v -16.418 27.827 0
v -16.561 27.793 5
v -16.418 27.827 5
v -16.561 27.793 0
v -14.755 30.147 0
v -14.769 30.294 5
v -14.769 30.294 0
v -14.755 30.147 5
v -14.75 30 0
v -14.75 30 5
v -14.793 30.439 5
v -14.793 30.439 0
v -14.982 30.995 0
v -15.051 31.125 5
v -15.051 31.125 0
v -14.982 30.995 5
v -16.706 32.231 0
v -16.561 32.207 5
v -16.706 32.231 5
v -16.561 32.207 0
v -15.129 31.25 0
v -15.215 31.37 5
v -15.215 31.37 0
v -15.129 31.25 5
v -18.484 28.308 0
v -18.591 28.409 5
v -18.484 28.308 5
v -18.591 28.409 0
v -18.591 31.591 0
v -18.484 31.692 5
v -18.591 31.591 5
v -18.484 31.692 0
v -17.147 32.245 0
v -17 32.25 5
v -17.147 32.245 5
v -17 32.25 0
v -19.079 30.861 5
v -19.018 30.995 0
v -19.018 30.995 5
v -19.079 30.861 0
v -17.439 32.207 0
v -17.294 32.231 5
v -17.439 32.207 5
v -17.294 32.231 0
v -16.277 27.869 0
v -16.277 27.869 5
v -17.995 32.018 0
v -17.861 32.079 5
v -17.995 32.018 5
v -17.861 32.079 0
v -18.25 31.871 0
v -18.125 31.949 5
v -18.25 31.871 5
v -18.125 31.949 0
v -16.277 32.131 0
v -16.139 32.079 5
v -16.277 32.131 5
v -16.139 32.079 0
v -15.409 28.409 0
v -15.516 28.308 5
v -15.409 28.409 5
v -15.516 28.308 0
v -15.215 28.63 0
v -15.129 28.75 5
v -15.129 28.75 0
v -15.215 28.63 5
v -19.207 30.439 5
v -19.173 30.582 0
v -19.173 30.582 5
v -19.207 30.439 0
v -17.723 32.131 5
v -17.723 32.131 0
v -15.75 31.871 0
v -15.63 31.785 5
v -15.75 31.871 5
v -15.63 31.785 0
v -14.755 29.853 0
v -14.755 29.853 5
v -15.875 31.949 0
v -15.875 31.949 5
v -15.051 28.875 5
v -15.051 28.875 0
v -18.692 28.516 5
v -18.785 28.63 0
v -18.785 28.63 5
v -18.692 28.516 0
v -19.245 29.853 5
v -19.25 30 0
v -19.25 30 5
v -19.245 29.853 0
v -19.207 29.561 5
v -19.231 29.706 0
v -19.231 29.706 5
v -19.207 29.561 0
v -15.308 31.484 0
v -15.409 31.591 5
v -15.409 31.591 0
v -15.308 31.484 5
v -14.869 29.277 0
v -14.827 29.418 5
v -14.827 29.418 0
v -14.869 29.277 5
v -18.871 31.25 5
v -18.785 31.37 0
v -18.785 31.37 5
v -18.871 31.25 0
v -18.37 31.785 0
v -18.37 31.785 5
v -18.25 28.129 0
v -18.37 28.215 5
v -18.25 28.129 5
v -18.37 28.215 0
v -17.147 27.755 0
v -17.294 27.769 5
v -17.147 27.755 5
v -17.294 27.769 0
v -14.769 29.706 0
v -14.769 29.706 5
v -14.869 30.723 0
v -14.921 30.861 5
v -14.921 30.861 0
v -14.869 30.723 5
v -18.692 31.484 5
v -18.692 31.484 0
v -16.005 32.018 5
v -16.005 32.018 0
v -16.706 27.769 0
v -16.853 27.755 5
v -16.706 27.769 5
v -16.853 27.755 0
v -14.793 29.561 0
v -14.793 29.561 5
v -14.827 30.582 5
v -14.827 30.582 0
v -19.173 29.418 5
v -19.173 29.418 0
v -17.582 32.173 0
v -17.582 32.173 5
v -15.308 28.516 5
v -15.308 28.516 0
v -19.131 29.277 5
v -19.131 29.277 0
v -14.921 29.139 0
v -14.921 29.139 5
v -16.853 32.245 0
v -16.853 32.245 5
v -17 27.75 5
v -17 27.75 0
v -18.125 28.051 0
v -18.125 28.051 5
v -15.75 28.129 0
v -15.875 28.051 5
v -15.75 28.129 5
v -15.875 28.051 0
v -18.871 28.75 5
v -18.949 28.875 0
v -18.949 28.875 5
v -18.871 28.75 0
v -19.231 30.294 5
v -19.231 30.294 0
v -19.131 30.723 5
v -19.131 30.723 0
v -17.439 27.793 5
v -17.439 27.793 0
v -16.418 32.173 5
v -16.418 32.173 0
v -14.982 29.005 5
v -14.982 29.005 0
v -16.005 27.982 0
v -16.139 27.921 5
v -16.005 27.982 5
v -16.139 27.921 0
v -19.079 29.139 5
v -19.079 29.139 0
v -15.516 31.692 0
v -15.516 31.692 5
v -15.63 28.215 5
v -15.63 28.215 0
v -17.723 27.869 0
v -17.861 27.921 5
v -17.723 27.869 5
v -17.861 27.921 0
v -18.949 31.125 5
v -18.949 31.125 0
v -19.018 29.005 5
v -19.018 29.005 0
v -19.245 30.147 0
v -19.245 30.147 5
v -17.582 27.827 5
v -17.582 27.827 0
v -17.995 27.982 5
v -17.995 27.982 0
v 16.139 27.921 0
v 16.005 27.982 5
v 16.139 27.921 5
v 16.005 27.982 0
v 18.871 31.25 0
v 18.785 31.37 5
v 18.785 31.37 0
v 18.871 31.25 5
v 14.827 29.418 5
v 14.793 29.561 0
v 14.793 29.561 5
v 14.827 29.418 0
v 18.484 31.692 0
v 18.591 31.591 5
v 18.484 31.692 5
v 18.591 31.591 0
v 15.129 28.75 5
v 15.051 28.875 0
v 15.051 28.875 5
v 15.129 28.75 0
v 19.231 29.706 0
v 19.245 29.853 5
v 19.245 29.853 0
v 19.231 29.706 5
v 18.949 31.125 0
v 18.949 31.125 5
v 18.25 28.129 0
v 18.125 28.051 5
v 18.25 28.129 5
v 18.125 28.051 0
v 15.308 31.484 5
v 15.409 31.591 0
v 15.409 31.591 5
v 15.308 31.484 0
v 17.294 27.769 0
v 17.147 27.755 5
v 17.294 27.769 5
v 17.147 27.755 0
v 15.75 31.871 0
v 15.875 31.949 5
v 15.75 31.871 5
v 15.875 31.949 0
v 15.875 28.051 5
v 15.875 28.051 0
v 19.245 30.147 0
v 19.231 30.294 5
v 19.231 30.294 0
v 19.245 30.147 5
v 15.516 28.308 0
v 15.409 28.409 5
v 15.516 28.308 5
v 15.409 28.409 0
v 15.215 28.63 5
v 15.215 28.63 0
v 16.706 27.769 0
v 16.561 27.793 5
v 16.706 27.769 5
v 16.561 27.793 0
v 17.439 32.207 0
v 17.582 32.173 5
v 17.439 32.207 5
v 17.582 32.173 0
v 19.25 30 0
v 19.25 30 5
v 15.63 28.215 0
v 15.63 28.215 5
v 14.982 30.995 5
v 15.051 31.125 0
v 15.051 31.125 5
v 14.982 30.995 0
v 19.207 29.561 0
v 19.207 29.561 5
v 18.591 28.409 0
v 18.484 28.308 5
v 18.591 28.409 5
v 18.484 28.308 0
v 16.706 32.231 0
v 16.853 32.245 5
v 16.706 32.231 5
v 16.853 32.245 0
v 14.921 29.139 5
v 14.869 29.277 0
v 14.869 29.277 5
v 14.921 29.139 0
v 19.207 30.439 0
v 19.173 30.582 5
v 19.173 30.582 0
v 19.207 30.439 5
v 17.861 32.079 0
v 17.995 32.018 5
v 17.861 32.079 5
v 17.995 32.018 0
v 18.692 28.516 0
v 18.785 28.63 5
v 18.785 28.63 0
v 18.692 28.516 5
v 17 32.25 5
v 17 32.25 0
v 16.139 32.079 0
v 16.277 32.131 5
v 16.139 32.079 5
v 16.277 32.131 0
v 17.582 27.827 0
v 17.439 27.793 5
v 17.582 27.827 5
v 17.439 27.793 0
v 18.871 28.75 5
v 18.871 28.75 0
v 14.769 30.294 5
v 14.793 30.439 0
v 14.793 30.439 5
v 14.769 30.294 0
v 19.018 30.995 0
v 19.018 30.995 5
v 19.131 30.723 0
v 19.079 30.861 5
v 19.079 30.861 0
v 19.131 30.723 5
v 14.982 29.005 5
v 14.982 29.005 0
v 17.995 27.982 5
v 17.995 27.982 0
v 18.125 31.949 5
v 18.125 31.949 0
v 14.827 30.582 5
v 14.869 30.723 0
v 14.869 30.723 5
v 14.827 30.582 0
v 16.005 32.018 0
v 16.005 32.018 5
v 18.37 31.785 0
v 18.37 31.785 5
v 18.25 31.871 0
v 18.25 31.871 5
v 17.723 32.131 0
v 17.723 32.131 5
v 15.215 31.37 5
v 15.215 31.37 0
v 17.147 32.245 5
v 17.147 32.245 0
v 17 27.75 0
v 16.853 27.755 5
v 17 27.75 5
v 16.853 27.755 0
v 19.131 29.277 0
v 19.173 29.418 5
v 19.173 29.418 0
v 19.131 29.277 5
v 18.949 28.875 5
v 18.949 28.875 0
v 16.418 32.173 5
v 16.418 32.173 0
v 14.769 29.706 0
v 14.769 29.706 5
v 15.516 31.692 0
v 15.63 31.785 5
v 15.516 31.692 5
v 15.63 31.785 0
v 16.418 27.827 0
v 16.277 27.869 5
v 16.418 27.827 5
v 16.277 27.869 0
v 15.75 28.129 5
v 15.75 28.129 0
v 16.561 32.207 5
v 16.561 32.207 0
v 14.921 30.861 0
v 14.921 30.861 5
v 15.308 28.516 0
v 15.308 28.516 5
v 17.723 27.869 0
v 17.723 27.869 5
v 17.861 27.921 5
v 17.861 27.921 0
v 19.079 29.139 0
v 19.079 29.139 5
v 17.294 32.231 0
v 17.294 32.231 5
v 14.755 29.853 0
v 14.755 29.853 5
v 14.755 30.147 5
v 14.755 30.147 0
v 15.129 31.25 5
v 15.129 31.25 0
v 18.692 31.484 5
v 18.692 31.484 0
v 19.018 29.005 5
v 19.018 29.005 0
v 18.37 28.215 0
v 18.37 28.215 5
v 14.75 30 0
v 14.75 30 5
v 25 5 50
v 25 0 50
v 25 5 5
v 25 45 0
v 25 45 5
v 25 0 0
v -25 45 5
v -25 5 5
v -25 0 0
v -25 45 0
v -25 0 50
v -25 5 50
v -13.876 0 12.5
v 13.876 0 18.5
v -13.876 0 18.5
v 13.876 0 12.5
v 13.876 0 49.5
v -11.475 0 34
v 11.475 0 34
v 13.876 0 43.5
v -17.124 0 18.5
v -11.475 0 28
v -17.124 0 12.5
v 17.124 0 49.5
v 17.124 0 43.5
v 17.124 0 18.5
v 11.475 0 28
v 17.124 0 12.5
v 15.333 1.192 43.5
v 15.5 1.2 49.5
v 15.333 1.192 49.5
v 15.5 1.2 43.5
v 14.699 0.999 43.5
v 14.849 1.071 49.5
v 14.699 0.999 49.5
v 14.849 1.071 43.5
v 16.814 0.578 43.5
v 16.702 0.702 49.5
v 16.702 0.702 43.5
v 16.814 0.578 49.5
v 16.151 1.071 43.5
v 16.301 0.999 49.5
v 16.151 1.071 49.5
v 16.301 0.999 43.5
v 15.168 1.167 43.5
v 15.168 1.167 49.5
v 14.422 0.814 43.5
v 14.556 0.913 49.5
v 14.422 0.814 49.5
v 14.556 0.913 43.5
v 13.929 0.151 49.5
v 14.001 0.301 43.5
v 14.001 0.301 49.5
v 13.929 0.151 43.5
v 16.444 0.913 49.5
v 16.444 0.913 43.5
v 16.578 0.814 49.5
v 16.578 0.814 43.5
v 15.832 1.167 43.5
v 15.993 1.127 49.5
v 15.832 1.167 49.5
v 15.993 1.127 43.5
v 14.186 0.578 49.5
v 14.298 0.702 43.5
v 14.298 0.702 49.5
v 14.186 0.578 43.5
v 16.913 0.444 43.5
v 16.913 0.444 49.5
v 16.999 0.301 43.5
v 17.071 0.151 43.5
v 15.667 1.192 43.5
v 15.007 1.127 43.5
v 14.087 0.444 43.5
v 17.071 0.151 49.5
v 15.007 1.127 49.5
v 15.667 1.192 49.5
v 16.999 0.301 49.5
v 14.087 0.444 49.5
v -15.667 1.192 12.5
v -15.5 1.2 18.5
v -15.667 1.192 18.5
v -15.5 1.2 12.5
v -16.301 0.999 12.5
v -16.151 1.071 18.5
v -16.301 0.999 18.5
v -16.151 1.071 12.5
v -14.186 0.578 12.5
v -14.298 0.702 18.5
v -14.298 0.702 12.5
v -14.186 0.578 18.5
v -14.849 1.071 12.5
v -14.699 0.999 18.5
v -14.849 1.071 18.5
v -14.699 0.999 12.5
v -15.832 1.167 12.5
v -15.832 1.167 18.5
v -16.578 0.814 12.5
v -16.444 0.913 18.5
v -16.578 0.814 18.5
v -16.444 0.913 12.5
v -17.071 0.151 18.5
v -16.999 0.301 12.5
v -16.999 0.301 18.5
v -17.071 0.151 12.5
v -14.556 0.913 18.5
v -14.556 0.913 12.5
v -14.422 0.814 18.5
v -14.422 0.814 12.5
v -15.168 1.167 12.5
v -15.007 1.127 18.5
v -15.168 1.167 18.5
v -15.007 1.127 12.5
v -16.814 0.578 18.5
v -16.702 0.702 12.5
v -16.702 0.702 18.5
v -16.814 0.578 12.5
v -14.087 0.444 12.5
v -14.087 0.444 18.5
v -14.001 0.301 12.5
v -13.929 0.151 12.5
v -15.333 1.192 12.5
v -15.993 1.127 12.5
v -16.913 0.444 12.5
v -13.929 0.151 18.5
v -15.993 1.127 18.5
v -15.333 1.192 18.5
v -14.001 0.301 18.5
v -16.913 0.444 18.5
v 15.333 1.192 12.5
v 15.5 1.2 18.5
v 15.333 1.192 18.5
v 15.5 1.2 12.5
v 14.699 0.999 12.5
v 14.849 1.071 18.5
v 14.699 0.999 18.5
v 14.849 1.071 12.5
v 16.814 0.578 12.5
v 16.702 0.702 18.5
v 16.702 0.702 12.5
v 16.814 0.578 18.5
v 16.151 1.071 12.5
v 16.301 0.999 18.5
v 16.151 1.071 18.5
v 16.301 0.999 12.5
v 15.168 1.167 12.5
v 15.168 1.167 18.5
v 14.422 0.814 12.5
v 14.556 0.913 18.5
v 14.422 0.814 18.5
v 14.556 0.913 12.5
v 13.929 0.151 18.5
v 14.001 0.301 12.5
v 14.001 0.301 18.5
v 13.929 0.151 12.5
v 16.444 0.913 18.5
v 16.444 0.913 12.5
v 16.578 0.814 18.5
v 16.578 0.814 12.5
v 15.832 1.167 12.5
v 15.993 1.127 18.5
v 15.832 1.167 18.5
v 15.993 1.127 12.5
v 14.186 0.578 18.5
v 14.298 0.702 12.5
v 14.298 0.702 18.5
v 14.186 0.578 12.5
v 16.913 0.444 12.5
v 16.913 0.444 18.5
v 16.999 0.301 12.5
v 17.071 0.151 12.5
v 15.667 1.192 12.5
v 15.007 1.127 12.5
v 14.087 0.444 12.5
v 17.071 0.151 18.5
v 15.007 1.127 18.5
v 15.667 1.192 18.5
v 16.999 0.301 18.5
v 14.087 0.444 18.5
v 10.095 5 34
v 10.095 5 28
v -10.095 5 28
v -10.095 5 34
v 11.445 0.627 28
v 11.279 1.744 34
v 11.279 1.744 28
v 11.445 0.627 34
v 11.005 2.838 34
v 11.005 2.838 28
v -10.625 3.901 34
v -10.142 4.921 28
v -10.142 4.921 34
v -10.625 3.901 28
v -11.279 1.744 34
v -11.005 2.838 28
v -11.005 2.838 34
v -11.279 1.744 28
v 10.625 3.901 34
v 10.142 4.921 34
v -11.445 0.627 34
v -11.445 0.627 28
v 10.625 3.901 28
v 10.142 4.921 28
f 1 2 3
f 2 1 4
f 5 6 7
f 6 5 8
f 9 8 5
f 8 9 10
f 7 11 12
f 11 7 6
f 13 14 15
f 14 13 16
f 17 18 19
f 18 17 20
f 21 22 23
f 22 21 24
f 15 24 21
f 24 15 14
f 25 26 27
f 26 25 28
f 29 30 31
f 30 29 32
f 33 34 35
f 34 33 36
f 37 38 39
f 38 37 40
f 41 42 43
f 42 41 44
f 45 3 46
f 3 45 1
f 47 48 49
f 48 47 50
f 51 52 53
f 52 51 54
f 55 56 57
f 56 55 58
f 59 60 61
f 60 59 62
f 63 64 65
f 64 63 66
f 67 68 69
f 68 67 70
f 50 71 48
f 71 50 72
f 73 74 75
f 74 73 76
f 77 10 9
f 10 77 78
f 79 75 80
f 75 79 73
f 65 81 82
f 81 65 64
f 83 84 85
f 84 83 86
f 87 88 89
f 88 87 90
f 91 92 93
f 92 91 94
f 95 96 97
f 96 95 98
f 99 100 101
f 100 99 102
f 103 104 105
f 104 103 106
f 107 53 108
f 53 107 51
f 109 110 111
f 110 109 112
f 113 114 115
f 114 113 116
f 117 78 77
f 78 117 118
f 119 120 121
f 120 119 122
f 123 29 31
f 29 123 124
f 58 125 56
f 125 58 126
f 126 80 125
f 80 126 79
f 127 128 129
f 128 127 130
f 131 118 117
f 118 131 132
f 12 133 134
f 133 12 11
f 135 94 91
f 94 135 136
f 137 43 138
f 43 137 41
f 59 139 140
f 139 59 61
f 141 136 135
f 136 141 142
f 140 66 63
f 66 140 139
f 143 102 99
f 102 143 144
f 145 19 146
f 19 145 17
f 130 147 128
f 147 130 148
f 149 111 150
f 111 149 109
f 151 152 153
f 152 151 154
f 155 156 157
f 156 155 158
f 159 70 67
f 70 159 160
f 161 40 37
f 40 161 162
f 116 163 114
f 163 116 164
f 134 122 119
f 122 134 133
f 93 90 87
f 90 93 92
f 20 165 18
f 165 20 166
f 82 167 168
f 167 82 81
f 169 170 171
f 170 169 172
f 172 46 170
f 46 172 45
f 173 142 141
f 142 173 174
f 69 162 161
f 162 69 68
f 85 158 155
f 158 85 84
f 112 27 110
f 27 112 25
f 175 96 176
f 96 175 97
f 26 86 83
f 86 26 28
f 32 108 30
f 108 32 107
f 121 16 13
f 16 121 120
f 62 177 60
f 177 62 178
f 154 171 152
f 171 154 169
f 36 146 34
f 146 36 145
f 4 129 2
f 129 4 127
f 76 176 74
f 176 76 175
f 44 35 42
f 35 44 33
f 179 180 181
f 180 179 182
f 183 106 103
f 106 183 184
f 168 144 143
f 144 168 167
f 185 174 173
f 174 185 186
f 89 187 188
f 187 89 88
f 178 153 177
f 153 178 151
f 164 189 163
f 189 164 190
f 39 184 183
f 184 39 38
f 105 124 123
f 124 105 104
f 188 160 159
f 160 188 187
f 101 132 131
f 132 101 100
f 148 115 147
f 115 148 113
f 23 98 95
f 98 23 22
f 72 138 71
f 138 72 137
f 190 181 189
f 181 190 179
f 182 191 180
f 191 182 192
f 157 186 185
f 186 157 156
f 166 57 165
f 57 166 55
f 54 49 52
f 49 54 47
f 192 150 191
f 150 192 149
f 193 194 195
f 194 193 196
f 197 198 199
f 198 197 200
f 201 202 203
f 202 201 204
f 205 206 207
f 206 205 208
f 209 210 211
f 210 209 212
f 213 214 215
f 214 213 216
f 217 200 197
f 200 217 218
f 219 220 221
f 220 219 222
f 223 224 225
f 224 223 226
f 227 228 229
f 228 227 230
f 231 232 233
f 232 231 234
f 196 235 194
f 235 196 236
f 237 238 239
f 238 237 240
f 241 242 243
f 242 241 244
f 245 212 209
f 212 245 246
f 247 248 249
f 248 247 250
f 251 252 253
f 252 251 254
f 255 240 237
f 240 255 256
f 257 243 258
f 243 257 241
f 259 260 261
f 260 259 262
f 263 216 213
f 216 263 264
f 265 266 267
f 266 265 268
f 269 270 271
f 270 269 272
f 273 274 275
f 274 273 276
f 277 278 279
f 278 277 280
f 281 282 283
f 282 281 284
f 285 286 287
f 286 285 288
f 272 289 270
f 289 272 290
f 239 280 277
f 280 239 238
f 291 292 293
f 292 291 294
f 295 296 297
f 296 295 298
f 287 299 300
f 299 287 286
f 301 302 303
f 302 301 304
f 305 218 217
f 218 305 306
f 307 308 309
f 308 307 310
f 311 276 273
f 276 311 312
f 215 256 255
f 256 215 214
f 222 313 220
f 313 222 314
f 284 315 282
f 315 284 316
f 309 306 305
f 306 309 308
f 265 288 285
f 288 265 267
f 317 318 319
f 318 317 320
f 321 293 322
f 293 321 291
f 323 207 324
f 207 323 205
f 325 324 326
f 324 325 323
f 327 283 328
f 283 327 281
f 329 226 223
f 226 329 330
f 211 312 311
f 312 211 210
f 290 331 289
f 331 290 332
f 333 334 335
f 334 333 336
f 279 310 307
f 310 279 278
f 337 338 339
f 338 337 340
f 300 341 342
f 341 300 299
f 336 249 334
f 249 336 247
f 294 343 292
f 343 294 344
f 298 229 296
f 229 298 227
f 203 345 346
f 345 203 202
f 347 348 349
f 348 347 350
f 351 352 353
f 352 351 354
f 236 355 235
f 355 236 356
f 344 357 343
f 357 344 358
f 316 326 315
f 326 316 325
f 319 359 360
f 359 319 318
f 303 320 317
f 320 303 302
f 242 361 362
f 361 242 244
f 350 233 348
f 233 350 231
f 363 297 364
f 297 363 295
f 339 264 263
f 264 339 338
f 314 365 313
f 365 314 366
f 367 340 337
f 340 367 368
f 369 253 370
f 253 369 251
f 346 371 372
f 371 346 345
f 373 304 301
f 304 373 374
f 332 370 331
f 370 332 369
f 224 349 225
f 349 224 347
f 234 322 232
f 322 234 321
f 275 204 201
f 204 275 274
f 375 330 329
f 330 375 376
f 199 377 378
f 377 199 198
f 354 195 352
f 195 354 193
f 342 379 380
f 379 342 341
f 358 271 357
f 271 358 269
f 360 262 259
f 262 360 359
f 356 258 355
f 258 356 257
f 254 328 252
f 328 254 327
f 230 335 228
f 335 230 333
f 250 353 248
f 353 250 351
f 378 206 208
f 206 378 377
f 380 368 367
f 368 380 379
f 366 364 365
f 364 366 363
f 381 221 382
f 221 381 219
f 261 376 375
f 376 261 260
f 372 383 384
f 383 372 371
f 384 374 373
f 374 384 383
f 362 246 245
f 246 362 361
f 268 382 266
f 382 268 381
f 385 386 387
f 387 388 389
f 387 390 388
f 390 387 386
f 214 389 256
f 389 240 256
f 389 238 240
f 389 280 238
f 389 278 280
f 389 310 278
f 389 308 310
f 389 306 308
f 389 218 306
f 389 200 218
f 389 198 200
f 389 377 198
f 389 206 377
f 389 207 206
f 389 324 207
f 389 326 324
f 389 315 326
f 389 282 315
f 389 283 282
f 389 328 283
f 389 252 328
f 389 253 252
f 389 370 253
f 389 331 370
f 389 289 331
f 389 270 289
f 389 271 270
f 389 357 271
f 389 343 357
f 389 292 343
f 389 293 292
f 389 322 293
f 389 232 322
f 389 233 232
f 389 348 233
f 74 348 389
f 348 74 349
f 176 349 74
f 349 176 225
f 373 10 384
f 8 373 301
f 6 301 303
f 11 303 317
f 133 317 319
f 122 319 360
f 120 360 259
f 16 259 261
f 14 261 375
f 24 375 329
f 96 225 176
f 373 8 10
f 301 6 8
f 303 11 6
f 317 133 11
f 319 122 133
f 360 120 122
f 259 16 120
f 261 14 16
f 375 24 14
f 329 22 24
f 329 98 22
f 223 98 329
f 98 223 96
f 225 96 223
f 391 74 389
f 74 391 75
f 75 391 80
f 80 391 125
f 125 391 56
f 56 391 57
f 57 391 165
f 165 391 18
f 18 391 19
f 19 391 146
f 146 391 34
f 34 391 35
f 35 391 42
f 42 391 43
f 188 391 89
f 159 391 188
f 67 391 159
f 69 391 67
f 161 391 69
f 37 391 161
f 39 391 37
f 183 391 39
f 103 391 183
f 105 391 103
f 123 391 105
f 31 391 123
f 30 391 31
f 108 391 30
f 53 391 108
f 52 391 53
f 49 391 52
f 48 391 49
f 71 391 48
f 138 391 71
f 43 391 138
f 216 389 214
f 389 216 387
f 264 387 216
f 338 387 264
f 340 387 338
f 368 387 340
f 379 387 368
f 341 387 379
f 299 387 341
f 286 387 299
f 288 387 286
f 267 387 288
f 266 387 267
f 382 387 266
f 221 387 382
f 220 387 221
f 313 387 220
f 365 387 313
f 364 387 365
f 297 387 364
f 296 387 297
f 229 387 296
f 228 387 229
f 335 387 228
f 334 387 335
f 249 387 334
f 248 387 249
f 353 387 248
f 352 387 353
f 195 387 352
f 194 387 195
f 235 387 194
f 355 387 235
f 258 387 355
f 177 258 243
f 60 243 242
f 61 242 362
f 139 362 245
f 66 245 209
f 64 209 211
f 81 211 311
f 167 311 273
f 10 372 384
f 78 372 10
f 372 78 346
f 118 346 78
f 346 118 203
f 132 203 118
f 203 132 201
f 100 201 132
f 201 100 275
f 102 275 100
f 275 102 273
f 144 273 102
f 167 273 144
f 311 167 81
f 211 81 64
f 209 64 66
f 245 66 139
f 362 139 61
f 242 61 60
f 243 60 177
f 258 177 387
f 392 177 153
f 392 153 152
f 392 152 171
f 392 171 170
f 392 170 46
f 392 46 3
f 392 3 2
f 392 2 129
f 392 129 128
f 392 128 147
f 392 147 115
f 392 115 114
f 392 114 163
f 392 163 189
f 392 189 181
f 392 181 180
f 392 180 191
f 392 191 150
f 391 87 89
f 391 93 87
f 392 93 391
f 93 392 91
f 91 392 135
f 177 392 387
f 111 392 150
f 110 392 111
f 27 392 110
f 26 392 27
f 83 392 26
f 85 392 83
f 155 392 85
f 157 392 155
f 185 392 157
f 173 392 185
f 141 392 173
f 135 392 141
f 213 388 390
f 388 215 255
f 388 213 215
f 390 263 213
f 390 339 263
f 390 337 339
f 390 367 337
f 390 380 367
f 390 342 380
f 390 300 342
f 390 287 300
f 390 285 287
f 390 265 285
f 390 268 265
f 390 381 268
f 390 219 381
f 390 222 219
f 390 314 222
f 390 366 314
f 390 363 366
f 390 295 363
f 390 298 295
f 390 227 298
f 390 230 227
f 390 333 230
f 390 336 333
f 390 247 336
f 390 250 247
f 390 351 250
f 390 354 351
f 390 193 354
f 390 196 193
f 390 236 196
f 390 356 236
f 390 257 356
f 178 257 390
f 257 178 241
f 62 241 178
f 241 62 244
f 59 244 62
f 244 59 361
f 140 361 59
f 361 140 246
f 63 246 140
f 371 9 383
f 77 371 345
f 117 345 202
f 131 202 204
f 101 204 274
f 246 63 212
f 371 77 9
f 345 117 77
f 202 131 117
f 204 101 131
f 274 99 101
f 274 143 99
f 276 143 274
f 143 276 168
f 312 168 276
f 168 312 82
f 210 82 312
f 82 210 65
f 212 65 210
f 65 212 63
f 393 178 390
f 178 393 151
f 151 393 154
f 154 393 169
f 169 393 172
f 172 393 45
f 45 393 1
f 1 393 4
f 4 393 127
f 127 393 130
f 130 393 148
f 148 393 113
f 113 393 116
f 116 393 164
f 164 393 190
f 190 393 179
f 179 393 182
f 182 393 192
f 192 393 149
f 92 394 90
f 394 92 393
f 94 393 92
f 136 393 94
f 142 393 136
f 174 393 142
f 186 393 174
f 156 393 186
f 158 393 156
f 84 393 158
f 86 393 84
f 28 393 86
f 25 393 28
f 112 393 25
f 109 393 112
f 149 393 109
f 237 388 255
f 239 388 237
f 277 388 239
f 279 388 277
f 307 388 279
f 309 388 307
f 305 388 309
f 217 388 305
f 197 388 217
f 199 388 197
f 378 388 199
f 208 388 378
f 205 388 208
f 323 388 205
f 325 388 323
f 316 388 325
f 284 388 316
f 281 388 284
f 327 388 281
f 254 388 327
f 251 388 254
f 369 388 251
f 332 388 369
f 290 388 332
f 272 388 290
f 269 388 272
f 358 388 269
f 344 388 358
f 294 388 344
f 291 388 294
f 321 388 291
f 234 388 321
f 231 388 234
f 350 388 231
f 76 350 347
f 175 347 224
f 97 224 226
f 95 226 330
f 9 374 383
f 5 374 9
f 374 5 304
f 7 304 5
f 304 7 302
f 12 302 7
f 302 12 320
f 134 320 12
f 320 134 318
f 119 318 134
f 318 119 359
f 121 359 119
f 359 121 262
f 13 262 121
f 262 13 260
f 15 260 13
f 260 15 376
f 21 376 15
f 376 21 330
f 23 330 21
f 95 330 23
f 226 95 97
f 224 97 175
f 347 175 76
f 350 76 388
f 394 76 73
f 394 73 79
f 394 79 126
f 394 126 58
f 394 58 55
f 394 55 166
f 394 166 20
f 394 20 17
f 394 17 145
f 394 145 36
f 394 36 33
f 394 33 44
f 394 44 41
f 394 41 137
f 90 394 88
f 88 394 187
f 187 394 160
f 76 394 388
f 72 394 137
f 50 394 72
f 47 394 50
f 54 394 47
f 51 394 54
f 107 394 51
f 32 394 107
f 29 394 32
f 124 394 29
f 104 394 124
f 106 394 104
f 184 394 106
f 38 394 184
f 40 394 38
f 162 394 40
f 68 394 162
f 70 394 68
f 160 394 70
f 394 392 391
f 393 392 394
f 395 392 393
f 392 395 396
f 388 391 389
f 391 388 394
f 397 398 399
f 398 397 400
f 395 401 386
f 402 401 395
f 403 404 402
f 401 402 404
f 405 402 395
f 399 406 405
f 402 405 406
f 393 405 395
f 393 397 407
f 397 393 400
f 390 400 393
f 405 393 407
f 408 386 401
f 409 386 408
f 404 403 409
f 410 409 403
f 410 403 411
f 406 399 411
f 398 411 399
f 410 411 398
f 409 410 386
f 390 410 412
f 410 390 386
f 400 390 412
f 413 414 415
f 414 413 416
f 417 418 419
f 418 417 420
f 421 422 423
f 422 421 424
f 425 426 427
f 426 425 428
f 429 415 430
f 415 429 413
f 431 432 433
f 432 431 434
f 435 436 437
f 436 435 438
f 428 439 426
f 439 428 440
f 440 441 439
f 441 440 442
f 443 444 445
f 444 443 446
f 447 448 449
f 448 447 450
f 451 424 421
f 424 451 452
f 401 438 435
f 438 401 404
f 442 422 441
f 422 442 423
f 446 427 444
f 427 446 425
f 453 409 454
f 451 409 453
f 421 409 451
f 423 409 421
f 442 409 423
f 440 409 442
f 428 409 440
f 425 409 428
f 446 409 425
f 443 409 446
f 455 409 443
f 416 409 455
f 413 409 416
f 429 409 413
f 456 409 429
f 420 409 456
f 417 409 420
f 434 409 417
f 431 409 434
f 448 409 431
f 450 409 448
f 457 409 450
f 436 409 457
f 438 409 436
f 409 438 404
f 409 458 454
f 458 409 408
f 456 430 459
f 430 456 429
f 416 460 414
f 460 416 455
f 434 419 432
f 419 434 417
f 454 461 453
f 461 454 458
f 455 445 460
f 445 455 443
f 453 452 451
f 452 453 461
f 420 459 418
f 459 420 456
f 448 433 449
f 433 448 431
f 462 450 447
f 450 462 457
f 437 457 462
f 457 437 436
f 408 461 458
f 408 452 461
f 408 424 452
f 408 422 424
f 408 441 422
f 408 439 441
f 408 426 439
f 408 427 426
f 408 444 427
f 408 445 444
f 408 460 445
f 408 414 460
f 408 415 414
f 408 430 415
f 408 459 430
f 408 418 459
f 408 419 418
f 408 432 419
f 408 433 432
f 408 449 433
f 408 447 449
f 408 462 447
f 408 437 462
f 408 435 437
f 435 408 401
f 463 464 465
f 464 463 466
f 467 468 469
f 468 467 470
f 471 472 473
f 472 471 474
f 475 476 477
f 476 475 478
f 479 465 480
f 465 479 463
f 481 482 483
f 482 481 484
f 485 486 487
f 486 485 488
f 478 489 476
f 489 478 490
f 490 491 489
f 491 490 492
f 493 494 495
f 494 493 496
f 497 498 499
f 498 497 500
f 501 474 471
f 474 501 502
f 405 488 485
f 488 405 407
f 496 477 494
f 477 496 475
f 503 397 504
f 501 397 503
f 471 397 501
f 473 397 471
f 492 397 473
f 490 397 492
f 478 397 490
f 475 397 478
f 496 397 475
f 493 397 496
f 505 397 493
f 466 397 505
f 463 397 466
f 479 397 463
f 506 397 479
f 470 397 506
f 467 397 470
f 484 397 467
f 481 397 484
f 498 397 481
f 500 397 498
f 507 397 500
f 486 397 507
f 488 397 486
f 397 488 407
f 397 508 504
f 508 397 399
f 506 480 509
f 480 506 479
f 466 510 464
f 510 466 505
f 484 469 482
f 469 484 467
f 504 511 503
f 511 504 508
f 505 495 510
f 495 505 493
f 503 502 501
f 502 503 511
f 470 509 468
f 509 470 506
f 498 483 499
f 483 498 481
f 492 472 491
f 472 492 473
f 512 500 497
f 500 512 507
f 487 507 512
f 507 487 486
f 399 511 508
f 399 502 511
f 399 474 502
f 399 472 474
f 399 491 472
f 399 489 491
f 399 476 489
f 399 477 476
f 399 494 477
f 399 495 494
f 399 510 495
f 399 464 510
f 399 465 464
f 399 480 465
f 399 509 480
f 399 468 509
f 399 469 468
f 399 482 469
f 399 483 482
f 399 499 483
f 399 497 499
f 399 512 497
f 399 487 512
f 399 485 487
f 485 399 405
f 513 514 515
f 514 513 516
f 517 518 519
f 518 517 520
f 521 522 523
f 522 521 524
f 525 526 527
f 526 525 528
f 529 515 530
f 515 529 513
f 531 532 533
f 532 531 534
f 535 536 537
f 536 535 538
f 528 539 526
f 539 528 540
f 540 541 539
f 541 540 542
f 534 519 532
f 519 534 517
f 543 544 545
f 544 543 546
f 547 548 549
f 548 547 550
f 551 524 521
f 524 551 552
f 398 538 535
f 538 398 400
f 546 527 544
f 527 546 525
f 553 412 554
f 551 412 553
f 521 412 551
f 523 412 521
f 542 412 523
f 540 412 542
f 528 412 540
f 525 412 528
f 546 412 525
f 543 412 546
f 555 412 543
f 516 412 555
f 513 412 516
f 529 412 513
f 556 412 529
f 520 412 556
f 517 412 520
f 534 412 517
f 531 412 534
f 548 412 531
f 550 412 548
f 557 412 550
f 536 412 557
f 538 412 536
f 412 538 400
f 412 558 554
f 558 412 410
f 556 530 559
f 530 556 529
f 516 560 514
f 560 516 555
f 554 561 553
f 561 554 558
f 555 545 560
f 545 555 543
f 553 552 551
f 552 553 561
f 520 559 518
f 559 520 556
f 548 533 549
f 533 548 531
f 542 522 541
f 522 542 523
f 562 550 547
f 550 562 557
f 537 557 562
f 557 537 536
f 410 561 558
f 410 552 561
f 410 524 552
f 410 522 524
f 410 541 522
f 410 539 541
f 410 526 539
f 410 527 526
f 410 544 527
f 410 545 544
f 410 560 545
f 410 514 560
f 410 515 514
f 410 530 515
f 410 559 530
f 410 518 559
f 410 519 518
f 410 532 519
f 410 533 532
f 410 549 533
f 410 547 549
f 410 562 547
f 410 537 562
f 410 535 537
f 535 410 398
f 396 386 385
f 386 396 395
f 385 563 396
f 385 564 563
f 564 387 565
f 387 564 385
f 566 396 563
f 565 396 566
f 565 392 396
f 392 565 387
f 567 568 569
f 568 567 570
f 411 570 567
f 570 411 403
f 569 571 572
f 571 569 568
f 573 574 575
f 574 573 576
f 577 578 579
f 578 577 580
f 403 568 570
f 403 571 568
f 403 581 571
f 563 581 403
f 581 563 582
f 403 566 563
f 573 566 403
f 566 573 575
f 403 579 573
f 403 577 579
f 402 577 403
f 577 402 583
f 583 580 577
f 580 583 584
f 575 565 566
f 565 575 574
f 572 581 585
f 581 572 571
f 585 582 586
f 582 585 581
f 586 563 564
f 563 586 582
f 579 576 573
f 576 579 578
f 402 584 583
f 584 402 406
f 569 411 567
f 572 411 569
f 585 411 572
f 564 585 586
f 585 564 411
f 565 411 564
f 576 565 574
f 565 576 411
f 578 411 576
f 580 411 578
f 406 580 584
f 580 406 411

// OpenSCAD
// L-shaped mounting bracket for NEMA 17 stepper motor (syringe pump)
// Print orientation: base plate on bed, vertical motor plate builds up +Z

// ---------------- Parameters ----------------
base_x0      = -25;   // base plate x start
base_x1      = 25;    // base plate x end
base_y0      = 0;     // base plate y start
base_y1      = 45;    // base plate y end
base_z0      = 0;     // base plate z start
base_z1      = 5;     // base plate z end

motor_plate_x0 = -25;  // motor plate x start (same as base)
motor_plate_x1 = 25;   // motor plate x end (same as base)
motor_plate_y0 = 0;    // motor plate y start (same as base)
motor_plate_y1 = 5;    // motor plate y end (back edge of base)
motor_plate_z0 = 0;    // motor plate z start (same as base)
motor_plate_z1 = 50;   // motor plate z end (top)

boss_d       = 23;     // motor centring boss hole diameter
boss_x       = 0;      // boss hole centre x
boss_z       = 28;     // boss hole centre z

screw_d      = 3.4;    // M3 screw hole diameter
screw_n      = 4;      // number of screw holes
screw_pitch  = 31;     // square pattern side length

gusset_t     = 5;      // gusset thickness (along X)
gusset_leg   = 20;     // right triangle legs along +Y and +Z
gusset_x0    = -25;    // gusset x start (left edge)
gusset_x1    = -20;    // gusset x end (left gusset)
gusset_x2    = 20;     // right gusset x start
gusset_x3    = 25;     // right gusset x end

eps          = 0.5;    // cutter overshoot past faces
$fn          = 96;     // curve resolution

// ---------------- Model ----------------
union() {
    // Base plate with two vertical through-holes (M4)
    difference() {
        translate([base_x0, base_y0, base_z0])
            cube([base_x1 - base_x0, base_y1 - base_y0, base_z1 - base_z0]);
        for (sx = [-17, 17])
            translate([sx, base_y1 - 15, -eps])
                cylinder(d = 4.5, h = base_z1 - base_z0 + 2 * eps);
    }

    // Vertical motor plate with boss hole and four M3 screw holes
    difference() {
        translate([motor_plate_x0, motor_plate_y0, motor_plate_z0])
            cube([motor_plate_x1 - motor_plate_x0,
                  motor_plate_y1 - motor_plate_y0,
                  motor_plate_z1 - motor_plate_z0]);
        // Boss hole along Y
        translate([boss_x, -eps, boss_z])
            cylinder(d = boss_d, h = motor_plate_y1 - motor_plate_y0 + 2 * eps, $fn = 64);
        // Screw holes on 31 mm square pattern, centred on boss hole
        for (i = [0 : screw_n - 1]) {
            a = screw_pitch / 2;
            x = boss_x + a * (i % 2 == 0 ? 1 : -1);
            z = boss_z + a * (i / 2 == 0 ? 1 : -1);
            translate([x, -eps, z])
                cylinder(d = screw_d, h = motor_plate_y1 - motor_plate_y0 + 2 * eps, $fn = 64);
        }
    }

    // Gussets flush with left and right edges
    for (gx = [gusset_x0, gusset_x2]) {
        translate([gx, 0, 0])
            linear_extrude(gusset_x1 - gx + eps)
                // right triangle in YZ plane: legs along +Y and +Z,
                // right-angle corner at y = 5, z = 5
                translate([0, gusset_leg, gusset_leg])
                    cube([gusset_leg, gusset_t, gusset_leg]);
    }
}
